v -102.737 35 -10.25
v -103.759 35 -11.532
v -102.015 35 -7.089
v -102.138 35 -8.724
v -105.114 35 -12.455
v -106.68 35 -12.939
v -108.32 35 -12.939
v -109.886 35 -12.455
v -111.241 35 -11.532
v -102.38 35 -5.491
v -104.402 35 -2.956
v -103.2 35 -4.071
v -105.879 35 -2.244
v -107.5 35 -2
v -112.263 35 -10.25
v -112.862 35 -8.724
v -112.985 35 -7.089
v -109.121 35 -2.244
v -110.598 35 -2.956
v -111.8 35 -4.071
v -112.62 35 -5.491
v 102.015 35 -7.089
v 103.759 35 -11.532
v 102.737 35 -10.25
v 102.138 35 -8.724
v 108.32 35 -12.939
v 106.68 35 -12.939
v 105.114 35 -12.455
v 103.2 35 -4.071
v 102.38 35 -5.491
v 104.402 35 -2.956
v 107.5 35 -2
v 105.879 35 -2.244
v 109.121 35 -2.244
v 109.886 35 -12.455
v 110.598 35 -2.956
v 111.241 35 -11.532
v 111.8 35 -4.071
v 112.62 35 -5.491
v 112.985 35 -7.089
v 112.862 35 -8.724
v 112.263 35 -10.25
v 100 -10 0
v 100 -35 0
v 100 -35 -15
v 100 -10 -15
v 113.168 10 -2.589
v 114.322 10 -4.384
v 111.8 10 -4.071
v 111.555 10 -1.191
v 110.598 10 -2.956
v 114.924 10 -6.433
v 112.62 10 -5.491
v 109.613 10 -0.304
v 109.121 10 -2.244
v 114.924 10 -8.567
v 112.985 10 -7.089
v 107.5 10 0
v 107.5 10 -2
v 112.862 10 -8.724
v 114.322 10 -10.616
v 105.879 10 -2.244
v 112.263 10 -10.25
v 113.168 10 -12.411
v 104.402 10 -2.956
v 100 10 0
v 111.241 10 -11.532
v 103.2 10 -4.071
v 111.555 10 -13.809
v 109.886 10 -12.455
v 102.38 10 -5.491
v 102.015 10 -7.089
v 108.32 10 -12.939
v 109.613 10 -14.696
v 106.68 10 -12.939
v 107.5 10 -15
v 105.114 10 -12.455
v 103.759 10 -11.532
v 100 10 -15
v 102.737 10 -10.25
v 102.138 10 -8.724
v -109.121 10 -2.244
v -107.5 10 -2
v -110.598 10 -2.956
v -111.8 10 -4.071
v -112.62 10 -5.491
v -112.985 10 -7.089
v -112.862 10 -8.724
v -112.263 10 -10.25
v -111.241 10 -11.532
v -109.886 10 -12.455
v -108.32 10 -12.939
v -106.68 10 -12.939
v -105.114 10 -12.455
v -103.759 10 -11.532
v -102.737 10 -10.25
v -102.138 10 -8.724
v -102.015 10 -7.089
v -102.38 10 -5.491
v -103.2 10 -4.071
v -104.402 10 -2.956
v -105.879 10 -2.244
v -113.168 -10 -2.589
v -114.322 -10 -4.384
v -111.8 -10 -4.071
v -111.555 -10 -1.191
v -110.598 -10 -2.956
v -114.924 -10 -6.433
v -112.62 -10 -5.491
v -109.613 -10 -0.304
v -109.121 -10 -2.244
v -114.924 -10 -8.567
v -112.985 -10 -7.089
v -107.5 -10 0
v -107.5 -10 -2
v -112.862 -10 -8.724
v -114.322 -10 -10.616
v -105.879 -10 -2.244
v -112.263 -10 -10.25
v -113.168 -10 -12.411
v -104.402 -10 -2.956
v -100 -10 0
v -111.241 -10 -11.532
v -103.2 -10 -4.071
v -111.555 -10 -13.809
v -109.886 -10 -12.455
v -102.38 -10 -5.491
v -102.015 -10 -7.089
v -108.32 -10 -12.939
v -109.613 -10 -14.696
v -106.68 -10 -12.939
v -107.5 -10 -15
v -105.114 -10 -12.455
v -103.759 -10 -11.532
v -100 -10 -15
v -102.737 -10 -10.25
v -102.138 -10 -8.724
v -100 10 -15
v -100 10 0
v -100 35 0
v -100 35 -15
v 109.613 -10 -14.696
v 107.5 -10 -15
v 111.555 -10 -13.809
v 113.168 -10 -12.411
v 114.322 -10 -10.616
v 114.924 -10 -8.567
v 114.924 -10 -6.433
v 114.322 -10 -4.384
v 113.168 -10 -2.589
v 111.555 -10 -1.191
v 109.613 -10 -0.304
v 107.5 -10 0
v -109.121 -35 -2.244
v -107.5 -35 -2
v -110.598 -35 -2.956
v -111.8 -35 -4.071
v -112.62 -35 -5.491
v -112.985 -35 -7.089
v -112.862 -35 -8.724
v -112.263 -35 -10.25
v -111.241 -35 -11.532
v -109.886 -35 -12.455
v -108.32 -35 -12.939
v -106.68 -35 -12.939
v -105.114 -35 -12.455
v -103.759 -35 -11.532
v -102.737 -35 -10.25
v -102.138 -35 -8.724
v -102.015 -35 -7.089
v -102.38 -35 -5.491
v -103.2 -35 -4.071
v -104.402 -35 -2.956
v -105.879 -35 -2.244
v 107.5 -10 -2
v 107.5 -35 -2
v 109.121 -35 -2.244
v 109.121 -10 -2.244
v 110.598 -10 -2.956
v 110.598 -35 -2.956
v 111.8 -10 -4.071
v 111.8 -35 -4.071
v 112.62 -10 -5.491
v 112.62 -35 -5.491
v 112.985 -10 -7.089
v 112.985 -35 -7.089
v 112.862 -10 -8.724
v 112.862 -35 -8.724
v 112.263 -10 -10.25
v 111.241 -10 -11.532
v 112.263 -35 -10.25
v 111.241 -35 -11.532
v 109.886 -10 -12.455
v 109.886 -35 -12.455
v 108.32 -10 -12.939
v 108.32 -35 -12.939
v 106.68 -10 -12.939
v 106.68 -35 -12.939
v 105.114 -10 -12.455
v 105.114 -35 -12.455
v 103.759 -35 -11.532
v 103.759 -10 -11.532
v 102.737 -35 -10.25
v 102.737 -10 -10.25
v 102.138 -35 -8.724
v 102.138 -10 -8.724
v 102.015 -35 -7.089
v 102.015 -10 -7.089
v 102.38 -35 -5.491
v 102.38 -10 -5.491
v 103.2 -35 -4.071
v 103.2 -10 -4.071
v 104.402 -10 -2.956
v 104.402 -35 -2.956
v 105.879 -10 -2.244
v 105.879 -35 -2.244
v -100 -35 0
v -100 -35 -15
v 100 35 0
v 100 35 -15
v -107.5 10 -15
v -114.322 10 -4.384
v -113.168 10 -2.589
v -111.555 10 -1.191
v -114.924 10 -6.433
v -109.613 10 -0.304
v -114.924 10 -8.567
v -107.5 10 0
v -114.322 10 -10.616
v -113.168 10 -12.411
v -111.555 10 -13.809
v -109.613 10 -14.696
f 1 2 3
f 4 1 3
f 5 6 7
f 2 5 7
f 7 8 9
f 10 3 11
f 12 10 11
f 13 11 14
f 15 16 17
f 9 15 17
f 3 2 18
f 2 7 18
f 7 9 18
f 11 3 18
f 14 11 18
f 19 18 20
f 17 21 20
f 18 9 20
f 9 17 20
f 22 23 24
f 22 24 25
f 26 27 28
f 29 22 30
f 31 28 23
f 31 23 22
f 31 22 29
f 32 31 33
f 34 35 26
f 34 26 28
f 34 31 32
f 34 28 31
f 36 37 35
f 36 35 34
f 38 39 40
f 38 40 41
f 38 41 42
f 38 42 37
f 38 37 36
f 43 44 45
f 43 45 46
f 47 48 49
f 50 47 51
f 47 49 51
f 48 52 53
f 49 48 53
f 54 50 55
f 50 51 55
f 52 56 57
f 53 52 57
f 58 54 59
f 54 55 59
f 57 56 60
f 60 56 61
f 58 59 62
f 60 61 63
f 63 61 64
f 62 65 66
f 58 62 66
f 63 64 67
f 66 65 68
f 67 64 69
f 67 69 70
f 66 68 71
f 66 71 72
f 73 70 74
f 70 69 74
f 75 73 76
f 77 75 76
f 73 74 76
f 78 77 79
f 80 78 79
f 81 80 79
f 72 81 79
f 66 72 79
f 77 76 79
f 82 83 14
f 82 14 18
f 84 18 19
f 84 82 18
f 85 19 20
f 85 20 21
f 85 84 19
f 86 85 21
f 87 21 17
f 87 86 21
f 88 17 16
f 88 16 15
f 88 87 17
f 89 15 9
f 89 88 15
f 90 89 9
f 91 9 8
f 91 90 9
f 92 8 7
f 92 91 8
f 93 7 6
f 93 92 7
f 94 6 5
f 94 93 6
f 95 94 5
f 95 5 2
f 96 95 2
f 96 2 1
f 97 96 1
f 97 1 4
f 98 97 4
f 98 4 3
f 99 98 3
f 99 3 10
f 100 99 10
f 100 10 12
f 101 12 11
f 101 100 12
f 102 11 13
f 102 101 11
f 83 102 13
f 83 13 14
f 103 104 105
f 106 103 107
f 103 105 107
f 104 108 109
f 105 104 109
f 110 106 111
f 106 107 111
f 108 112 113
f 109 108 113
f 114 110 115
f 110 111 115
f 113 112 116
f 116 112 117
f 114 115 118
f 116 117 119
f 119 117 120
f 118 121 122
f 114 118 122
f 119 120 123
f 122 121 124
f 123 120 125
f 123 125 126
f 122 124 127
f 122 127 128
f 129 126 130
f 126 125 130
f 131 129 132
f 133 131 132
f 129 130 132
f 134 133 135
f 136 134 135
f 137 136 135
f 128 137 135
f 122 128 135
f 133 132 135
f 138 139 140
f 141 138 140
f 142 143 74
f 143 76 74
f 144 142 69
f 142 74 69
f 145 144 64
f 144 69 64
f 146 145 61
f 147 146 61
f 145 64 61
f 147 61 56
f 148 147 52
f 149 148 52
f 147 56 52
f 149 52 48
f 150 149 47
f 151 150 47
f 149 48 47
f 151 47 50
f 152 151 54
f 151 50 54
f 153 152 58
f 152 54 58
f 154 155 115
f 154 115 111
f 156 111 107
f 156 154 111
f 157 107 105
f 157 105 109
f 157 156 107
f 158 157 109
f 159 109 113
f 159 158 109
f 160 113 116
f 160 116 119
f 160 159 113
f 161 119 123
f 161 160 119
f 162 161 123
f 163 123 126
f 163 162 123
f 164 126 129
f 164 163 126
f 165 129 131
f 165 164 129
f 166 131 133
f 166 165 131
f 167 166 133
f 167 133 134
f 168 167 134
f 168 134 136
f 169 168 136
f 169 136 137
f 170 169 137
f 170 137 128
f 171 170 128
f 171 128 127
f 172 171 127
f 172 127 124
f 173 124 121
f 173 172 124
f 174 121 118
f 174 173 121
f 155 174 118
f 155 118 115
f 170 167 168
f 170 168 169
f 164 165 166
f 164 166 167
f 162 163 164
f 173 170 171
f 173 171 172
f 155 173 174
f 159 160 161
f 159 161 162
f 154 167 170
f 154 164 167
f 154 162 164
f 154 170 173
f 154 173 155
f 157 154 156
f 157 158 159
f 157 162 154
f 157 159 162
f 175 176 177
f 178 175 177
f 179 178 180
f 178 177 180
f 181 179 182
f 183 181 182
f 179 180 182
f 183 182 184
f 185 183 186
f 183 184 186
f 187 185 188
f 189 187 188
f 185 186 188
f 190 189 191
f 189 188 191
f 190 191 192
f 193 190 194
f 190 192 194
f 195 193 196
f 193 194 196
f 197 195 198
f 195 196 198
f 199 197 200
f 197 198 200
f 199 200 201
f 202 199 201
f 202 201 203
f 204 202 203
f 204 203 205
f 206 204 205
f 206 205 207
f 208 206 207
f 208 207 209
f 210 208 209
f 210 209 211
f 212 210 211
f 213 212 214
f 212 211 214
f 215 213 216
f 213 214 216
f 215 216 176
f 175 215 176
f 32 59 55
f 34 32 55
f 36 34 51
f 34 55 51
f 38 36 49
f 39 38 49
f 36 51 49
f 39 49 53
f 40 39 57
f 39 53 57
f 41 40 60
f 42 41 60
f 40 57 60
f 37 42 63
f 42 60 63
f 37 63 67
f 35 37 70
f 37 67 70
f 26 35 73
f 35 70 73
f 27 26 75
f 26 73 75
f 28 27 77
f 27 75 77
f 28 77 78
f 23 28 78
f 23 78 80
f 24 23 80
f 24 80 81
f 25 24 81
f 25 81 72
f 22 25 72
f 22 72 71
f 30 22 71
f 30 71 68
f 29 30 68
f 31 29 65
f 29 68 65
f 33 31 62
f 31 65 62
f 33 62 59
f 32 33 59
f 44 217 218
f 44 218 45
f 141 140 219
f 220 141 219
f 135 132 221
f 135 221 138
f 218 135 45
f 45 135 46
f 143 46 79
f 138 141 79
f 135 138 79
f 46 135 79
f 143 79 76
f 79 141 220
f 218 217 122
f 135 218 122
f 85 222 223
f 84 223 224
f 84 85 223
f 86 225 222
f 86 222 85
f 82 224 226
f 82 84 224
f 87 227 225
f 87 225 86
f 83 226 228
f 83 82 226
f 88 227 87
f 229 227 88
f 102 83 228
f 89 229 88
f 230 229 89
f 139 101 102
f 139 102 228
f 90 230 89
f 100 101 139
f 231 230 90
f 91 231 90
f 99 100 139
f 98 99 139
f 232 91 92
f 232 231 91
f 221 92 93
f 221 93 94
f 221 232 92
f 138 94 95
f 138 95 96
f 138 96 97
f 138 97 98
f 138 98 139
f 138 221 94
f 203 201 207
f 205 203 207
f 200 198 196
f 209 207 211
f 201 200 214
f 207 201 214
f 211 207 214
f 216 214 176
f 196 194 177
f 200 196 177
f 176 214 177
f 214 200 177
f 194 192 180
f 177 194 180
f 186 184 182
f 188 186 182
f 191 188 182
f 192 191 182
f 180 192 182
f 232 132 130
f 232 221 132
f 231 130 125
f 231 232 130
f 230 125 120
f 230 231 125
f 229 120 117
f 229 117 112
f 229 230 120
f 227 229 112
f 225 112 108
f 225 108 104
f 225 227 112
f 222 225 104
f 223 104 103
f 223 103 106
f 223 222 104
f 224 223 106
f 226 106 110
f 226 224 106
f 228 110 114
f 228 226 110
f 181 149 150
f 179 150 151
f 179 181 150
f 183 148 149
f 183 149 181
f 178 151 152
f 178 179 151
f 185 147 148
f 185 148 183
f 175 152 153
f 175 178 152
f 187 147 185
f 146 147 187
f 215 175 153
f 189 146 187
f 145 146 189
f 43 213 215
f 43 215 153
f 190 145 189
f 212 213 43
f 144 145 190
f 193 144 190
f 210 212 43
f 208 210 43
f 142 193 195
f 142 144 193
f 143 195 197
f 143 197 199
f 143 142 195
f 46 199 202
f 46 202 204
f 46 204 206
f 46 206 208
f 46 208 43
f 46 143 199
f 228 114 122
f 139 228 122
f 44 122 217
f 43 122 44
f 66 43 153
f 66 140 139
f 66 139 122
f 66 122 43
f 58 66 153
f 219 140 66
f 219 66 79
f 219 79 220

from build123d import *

# Parameters (mm, degrees)
PLATE_SKETCH_W            = 200
PLATE_SKETCH_H            = 70
PLATE_EXTRUDE_DEPTH       = 15
HINGE_PLATE_EXTRUDE_DEPTH = 10
PIN_SKETCH_R              = 5.5
UPPER_PIN_EXTRUDE_DEPTH   = 25
LOWER_START               = -45
PIN_SKETCH_2_R            = 5.5
LOWER_PIN_EXTRUDE_DEPTH   = 25


with BuildPart() as part:
    # Plate Sketch → Plate Extrude (new body)
    with BuildSketch(Plane.XY):
        Rectangle(PLATE_SKETCH_W, PLATE_SKETCH_H)
    extrude(amount=-PLATE_EXTRUDE_DEPTH)

    # Hinge Plate Sketch → Hinge Plate Extrude (add, symmetric)
    with BuildSketch(Plane(origin=(0, 0, 0), x_dir=(1, 0, 0), z_dir=(0, 1, 0))):
        with BuildLine():
            Line((100, 15), (107.5, 15))
            ThreePointArc((107.5, 15), (115, 7.5), (107.5, 0))
            Line((107.5, 0), (100, 0))
            Line((100, 0), (100, 15))
        make_face()
    hinge_plate_extrude = extrude(amount=HINGE_PLATE_EXTRUDE_DEPTH, both=True)

    # Pin Sketch → Upper Pin Extrude (add)
    with BuildSketch(Plane(origin=(0, 10, 0), x_dir=(1, 0, 0), z_dir=(0, 1, 0))):
        with Locations(Location((107.5, 7.5, 0), (0, 0, 270))):
            Circle(PIN_SKETCH_R)
    upper_pin_extrude = extrude(amount=UPPER_PIN_EXTRUDE_DEPTH)

    # Pin Sketch<2> → Lower Pin Extrude (add)
    with BuildSketch(Plane(origin=(0, 10, 0), x_dir=(1, 0, 0), z_dir=(0, 1, 0)).offset(LOWER_START)):
        with Locations(Location((107.5, 7.5, 0), (0, 0, 270))):
            Circle(PIN_SKETCH_2_R)
    lower_pin_extrude = extrude(amount=LOWER_PIN_EXTRUDE_DEPTH)

    # Hinge Mirror: Hinge Plate Extrude, Upper Pin Extrude, Lower Pin Extrude across plane
    add(hinge_plate_extrude.mirror(Plane(origin=(0, 0, 0), x_dir=(0, 0, 1), z_dir=(1, 0, 0))))
    add(upper_pin_extrude.mirror(Plane(origin=(0, 0, 0), x_dir=(0, 0, 1), z_dir=(1, 0, 0))))
    add(lower_pin_extrude.mirror(Plane(origin=(0, 0, 0), x_dir=(0, 0, 1), z_dir=(1, 0, 0))))


solid = part.part
